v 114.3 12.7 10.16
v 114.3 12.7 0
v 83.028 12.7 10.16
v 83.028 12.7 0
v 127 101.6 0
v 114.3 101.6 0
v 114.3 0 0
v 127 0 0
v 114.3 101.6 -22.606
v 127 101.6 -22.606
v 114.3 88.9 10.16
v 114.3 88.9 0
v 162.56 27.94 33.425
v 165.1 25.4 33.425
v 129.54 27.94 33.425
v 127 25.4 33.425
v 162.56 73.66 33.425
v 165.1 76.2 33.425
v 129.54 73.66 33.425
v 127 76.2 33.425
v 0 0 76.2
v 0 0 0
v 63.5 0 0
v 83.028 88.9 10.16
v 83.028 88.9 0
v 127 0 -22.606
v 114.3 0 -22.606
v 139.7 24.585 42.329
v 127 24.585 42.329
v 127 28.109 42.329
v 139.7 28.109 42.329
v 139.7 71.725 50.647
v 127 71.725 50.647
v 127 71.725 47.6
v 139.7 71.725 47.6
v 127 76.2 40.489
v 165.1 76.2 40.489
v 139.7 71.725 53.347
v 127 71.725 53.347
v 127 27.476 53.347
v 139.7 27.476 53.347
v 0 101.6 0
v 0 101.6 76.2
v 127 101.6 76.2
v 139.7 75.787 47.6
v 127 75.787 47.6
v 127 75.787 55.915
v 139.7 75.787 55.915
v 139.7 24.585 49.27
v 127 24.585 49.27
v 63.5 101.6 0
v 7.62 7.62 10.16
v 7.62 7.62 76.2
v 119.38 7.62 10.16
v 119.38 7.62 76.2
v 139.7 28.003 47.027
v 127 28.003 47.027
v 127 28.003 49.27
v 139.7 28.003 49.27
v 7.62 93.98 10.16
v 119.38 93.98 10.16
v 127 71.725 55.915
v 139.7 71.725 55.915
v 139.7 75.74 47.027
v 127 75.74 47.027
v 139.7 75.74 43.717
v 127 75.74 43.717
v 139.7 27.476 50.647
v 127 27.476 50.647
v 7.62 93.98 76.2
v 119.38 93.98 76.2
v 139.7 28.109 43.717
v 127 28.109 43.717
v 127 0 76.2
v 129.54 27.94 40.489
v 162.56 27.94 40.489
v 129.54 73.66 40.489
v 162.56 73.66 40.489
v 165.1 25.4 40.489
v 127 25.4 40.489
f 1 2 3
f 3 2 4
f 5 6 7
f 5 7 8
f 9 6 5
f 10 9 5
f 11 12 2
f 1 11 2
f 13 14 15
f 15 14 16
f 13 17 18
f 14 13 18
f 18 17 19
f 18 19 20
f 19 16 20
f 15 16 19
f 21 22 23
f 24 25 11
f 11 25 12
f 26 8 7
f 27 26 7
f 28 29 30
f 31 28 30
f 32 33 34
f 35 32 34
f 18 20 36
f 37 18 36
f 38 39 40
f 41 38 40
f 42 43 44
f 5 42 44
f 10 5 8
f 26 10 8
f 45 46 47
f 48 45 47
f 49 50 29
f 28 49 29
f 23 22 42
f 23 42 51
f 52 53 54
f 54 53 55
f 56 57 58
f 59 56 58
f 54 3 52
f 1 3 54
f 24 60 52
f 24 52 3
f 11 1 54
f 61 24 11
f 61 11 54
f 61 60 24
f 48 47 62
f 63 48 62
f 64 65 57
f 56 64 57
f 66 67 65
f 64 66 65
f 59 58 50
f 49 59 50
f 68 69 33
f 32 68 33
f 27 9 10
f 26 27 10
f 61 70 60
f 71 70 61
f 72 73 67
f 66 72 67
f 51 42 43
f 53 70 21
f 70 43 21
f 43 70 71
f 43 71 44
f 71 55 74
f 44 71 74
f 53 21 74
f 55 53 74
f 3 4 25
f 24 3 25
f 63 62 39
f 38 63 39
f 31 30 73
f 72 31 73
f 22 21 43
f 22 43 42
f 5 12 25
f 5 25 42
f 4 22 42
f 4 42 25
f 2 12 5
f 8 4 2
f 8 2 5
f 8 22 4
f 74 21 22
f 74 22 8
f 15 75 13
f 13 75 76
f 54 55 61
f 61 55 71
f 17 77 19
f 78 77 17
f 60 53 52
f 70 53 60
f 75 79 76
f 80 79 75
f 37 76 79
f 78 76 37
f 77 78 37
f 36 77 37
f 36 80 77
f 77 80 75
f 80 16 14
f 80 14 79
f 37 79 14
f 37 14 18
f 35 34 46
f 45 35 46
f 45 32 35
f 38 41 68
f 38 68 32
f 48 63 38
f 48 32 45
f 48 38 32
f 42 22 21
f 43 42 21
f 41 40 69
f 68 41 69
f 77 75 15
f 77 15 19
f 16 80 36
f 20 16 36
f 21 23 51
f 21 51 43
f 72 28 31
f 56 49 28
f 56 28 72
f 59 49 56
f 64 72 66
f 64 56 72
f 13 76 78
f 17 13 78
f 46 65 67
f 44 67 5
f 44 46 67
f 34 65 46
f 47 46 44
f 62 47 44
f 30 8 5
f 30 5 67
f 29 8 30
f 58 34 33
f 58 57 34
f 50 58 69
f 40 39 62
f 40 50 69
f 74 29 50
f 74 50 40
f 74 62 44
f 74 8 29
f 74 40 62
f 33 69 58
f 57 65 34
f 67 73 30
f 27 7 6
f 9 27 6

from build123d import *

# Parameters (mm, degrees)
F0_W      = 127
F0_H      = 76.2
F1_DEPTH  = 101.6
F2_W      = 111.76
F2_H      = 86.36
F3_DEPTH  = 66.04
F5_DEPTH  = 25.4
F7_DEPTH  = 22.606
F9_DEPTH  = 101.6
F10_W     = 50.8
F10_H     = 7.0630987705
F11_DEPTH = 38.1
F12_W     = 31.4156402662
F12_H     = 38.1
F13_DEPTH = 50.8
F16_W     = 33.02
F16_H     = 45.72
F16_W_2   = 31.4156402662
F16_H_2   = 38.1
F17_DEPTH = 25.4
F19_DEPTH = 12.7
F21_DEPTH = 12.7


# Not quite as in the source:
# - the program builds the solid bodies; features that only make, move or delete a surface that nothing else refers to are left out


with BuildPart() as f1:
    # F0 (on Front) → F1 (new body)
    with BuildSketch(Plane.XZ):
        with Locations((63.5, 38.1)):
            Rectangle(F0_W, F0_H)
    extrude(amount=-F1_DEPTH)

    # F2 (on face) → F3 (cut)
    with BuildSketch(Plane.XY.offset(76.2)):
        with Locations((63.5, 50.8)):
            Rectangle(F2_W, F2_H)
    extrude(amount=-F3_DEPTH, mode=Mode.SUBTRACT)

    # F4 (on face) → F5 (cut)
    with BuildSketch(Plane(origin=(0, 0, 0), x_dir=(1, 0, 0), z_dir=(0, 0, -1))):
        Polygon((114.3, -12.7), (83.0283915298, -12.7), (83.0283915298, -88.9), (90.3639442819, -88.9), (114.3, -88.9), align=None)
    extrude(amount=-F5_DEPTH, mode=Mode.SUBTRACT)

    # F18 (on face) → F19 (join)
    with BuildSketch(Plane.YZ.offset(127)):
        Polygon((24.5852842927, 49.2701493204), (24.5852842927, 42.3285476863), (28.1094815582, 42.3285476863), (28.1094815582, 43.716866523), (75.7395401597, 43.716866523), (75.7395401597, 47.0274761319), (61.3223686814, 47.0274761319), (28.0026886612, 47.0274761319), (28.0026886612, 49.2701493204), align=None)
    extrude(amount=F19_DEPTH)

    # F20 (on face) → F21 (join)
    with BuildSketch(Plane.YZ.offset(127)):
        Polygon((75.7866054773, 47.5999712944), (75.7866054773, 48.753041774), (75.7866054773, 52.4664781988), (75.7866054773, 55.914670229), (71.7250332236, 55.914670229), (71.7250332236, 53.3474907279), (27.4760443717, 53.3474907279), (27.4760443717, 50.6468489766), (71.7250332236, 50.6468489766), (71.7250332236, 47.5999712944), align=None)
    extrude(amount=F21_DEPTH)


with BuildPart() as f7:
    # F6 (on face) → F7 (new body)
    with BuildSketch(Plane(origin=(0, 0, 0), x_dir=(1, 0, 0), z_dir=(0, 0, -1))):
        Polygon((114.3, 0), (114.3, -12.7), (114.3, -88.9), (114.3, -101.6), (127, -101.6), (127, 0), align=None)
    extrude(amount=F7_DEPTH)


with BuildPart() as f9:
    # F8 (on face) → F9 (new body)
    with BuildSketch(Plane.XZ):
        Polygon((63.5, 0), (0, 76.2), (0, 0), align=None)
    extrude(amount=-F9_DEPTH)


with BuildPart() as f11:
    # F10 (on face) → F11 (new body)
    with BuildSketch(Plane.YZ.offset(127)):
        with Locations((50.8, 36.9570013136)):
            Rectangle(F10_W, F10_H)
    extrude(amount=F11_DEPTH)

    # F12 (on face) → F13 (cut)
    with BuildSketch(Plane.XY.offset(40.4885506988)):
        with Locations((145.3281798669, 50.8)):
            Rectangle(F12_W, F12_H)
    extrude(amount=-F13_DEPTH, mode=Mode.SUBTRACT)

    # F16 (on face) → F17 (cut)
    with BuildSketch(Plane.XY.offset(40.4885506988)):
        with Locations((146.05, 50.8)):
            Rectangle(F16_W, F16_H)
        with Locations((145.3281798669, 50.8)):
            Rectangle(F16_W_2, F16_H_2, mode=Mode.SUBTRACT)
    extrude(amount=-F17_DEPTH, mode=Mode.SUBTRACT)


solid = Compound([f1.part, f7.part, f9.part, f11.part])
